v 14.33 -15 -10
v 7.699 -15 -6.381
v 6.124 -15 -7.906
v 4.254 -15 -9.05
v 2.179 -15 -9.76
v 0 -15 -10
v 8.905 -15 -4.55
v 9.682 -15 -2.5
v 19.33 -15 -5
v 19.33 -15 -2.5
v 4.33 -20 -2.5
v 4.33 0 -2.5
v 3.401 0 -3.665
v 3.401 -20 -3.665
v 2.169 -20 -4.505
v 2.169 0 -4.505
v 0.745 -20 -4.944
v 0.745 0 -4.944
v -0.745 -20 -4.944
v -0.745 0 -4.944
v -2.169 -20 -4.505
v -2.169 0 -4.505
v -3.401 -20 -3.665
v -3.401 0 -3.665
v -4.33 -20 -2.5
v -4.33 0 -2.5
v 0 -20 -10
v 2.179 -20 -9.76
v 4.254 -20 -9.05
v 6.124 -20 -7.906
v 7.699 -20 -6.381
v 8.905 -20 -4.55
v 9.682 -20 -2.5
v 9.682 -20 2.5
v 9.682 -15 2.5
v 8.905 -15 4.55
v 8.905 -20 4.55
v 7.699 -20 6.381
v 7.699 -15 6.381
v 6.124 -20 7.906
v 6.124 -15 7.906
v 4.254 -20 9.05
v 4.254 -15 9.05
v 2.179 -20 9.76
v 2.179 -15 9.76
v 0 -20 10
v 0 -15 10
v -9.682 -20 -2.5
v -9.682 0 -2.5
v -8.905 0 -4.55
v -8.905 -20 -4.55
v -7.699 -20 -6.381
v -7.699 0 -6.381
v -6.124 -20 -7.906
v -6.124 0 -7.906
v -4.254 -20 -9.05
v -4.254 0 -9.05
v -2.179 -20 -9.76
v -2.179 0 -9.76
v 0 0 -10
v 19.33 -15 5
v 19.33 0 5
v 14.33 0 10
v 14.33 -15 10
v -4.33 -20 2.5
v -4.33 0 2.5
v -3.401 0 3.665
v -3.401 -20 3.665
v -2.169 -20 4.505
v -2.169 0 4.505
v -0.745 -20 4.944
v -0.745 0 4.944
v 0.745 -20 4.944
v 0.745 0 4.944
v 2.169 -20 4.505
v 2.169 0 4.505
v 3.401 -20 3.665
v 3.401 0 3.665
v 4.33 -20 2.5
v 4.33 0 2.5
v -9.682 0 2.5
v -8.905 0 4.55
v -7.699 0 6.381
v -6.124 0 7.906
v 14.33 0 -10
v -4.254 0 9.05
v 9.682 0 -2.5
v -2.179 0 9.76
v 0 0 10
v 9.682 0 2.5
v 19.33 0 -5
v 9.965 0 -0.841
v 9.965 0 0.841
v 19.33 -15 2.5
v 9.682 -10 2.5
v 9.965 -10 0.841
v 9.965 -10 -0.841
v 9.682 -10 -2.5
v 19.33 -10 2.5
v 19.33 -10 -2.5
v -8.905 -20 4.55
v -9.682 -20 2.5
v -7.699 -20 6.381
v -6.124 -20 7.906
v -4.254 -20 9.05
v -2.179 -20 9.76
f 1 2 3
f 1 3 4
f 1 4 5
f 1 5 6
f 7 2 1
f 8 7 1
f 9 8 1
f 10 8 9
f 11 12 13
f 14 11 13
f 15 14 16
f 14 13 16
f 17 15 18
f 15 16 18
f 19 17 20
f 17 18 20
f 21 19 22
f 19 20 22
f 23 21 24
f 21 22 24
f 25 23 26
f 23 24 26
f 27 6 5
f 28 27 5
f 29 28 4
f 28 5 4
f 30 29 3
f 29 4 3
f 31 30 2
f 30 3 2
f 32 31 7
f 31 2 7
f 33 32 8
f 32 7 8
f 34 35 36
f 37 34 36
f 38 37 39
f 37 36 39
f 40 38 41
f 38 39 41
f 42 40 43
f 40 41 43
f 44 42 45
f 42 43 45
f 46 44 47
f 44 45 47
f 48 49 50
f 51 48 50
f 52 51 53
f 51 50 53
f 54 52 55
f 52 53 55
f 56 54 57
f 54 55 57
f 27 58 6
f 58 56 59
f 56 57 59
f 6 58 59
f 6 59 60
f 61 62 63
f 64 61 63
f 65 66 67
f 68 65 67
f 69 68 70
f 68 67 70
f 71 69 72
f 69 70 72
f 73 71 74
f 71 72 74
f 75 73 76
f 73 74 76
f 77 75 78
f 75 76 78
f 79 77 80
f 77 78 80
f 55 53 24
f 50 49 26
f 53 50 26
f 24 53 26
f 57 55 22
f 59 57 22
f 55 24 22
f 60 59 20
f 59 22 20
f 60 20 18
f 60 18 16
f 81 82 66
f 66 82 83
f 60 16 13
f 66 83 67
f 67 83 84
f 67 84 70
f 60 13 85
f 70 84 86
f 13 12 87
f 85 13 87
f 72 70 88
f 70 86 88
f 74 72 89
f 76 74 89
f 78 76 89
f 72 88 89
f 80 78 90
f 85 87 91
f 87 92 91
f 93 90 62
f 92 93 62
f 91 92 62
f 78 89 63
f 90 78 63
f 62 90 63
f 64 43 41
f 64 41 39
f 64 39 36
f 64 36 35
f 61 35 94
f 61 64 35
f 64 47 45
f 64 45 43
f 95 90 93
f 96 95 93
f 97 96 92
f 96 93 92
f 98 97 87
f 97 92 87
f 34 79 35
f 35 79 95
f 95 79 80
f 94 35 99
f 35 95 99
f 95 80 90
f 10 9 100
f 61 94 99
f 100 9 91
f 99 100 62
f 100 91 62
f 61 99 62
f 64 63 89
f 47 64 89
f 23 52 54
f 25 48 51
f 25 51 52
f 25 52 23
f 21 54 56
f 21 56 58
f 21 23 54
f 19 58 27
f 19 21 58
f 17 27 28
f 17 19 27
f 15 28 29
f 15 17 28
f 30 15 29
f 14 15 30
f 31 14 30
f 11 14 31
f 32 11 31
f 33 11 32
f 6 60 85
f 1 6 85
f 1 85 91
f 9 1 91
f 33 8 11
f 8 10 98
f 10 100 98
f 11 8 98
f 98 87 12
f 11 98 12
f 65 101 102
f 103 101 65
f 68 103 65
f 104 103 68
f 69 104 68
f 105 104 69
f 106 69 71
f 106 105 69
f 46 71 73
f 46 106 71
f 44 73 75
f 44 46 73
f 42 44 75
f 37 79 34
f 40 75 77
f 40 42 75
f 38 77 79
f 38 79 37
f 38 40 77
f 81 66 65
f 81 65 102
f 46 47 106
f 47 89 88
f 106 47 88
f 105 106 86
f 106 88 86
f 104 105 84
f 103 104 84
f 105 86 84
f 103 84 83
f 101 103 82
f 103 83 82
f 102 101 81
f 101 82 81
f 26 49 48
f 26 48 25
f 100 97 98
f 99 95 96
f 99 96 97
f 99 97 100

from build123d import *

# Parameters (mm, degrees)
F1_DEPTH = 20
F2_DEPTH = 15
F3_DEPTH = 10
F4_DEPTH = 25


with BuildPart() as f1:
    # F0 (on Front) → F1 (new body)
    with BuildSketch(Plane.XZ):
        with BuildLine():
            ThreePointArc((-4.330127, 2.5), (0, 5), (4.330127, 2.5))
            Line((4.330127, 2.5), (9.682458, 2.5))
            ThreePointArc((9.682458, 2.5), (6.123724, 7.905694), (0, 10))
            ThreePointArc((0, 10), (-6.123724, 7.905694), (-9.682458, 2.5))
            Line((-9.682458, 2.5), (-4.330127, 2.5))
        make_face()
        with BuildLine():
            Line((9.682458, -2.5), (4.330127, -2.5))
            ThreePointArc((4.330127, -2.5), (0, -5), (-4.330127, -2.5))
            Line((-4.330127, -2.5), (-9.682458, -2.5))
            ThreePointArc((-9.682458, -2.5), (-6.123724, -7.905694), (0, -10))
            ThreePointArc((0, -10), (6.123724, -7.905694), (9.682458, -2.5))
        make_face()
        with BuildLine():
            ThreePointArc((-5, 0), (-4.829629, 1.294095), (-4.330127, 2.5))
            Line((-4.330127, 2.5), (-9.682458, 2.5))
            ThreePointArc((-9.682458, 2.5), (-9.920297, 1.260043), (-10, 0))
            ThreePointArc((-10, 0), (-9.920297, -1.260043), (-9.682458, -2.5))
            Line((-9.682458, -2.5), (-4.330127, -2.5))
            ThreePointArc((-4.330127, -2.5), (-4.829629, -1.294095), (-5, 0))
        make_face()
    extrude(amount=F1_DEPTH)

    # F0 (on Front) → F2 (join)
    with BuildSketch(Plane.XZ):
        with BuildLine():
            ThreePointArc((0, 10), (6.123724, 7.905694), (9.682458, 2.5))
            Line((9.682458, 2.5), (19.330127, 2.5))
            Line((19.330127, 2.5), (19.330127, 5))
            Line((19.330127, 5), (14.330127, 10))
            Line((14.330127, 10), (0, 10))
        make_face()
        with BuildLine():
            Line((19.330127, -2.5), (9.682458, -2.5))
            ThreePointArc((9.682458, -2.5), (6.123724, -7.905694), (0, -10))
            Line((0, -10), (14.330127, -10))
            Line((14.330127, -10), (19.330127, -5))
            Line((19.330127, -5), (19.330127, -2.5))
        make_face()
    extrude(amount=F2_DEPTH)

    # F0 (on Front) → F3 (join)
    with BuildSketch(Plane.XZ):
        with BuildLine():
            Line((19.330127, 2.5), (9.682458, 2.5))
            ThreePointArc((9.682458, 2.5), (10, 0), (9.682458, -2.5))
            Line((9.682458, -2.5), (19.330127, -2.5))
            Line((19.330127, -2.5), (19.330127, 0))
            Line((19.330127, 0), (19.330127, 2.5))
        make_face()
    extrude(amount=F3_DEPTH)

    # F0 (on Front) → F4 (cut)
    with BuildSketch(Plane.XZ):
        with BuildLine():
            ThreePointArc((-5, 0), (-4.829629, 1.294095), (-4.330127, 2.5))
            Line((-4.330127, 2.5), (-9.682458, 2.5))
            ThreePointArc((-9.682458, 2.5), (-9.920297, 1.260043), (-10, 0))
            ThreePointArc((-10, 0), (-9.920297, -1.260043), (-9.682458, -2.5))
            Line((-9.682458, -2.5), (-4.330127, -2.5))
            ThreePointArc((-4.330127, -2.5), (-4.829629, -1.294095), (-5, 0))
        make_face()
    extrude(amount=F4_DEPTH, mode=Mode.SUBTRACT)


solid = f1.part
